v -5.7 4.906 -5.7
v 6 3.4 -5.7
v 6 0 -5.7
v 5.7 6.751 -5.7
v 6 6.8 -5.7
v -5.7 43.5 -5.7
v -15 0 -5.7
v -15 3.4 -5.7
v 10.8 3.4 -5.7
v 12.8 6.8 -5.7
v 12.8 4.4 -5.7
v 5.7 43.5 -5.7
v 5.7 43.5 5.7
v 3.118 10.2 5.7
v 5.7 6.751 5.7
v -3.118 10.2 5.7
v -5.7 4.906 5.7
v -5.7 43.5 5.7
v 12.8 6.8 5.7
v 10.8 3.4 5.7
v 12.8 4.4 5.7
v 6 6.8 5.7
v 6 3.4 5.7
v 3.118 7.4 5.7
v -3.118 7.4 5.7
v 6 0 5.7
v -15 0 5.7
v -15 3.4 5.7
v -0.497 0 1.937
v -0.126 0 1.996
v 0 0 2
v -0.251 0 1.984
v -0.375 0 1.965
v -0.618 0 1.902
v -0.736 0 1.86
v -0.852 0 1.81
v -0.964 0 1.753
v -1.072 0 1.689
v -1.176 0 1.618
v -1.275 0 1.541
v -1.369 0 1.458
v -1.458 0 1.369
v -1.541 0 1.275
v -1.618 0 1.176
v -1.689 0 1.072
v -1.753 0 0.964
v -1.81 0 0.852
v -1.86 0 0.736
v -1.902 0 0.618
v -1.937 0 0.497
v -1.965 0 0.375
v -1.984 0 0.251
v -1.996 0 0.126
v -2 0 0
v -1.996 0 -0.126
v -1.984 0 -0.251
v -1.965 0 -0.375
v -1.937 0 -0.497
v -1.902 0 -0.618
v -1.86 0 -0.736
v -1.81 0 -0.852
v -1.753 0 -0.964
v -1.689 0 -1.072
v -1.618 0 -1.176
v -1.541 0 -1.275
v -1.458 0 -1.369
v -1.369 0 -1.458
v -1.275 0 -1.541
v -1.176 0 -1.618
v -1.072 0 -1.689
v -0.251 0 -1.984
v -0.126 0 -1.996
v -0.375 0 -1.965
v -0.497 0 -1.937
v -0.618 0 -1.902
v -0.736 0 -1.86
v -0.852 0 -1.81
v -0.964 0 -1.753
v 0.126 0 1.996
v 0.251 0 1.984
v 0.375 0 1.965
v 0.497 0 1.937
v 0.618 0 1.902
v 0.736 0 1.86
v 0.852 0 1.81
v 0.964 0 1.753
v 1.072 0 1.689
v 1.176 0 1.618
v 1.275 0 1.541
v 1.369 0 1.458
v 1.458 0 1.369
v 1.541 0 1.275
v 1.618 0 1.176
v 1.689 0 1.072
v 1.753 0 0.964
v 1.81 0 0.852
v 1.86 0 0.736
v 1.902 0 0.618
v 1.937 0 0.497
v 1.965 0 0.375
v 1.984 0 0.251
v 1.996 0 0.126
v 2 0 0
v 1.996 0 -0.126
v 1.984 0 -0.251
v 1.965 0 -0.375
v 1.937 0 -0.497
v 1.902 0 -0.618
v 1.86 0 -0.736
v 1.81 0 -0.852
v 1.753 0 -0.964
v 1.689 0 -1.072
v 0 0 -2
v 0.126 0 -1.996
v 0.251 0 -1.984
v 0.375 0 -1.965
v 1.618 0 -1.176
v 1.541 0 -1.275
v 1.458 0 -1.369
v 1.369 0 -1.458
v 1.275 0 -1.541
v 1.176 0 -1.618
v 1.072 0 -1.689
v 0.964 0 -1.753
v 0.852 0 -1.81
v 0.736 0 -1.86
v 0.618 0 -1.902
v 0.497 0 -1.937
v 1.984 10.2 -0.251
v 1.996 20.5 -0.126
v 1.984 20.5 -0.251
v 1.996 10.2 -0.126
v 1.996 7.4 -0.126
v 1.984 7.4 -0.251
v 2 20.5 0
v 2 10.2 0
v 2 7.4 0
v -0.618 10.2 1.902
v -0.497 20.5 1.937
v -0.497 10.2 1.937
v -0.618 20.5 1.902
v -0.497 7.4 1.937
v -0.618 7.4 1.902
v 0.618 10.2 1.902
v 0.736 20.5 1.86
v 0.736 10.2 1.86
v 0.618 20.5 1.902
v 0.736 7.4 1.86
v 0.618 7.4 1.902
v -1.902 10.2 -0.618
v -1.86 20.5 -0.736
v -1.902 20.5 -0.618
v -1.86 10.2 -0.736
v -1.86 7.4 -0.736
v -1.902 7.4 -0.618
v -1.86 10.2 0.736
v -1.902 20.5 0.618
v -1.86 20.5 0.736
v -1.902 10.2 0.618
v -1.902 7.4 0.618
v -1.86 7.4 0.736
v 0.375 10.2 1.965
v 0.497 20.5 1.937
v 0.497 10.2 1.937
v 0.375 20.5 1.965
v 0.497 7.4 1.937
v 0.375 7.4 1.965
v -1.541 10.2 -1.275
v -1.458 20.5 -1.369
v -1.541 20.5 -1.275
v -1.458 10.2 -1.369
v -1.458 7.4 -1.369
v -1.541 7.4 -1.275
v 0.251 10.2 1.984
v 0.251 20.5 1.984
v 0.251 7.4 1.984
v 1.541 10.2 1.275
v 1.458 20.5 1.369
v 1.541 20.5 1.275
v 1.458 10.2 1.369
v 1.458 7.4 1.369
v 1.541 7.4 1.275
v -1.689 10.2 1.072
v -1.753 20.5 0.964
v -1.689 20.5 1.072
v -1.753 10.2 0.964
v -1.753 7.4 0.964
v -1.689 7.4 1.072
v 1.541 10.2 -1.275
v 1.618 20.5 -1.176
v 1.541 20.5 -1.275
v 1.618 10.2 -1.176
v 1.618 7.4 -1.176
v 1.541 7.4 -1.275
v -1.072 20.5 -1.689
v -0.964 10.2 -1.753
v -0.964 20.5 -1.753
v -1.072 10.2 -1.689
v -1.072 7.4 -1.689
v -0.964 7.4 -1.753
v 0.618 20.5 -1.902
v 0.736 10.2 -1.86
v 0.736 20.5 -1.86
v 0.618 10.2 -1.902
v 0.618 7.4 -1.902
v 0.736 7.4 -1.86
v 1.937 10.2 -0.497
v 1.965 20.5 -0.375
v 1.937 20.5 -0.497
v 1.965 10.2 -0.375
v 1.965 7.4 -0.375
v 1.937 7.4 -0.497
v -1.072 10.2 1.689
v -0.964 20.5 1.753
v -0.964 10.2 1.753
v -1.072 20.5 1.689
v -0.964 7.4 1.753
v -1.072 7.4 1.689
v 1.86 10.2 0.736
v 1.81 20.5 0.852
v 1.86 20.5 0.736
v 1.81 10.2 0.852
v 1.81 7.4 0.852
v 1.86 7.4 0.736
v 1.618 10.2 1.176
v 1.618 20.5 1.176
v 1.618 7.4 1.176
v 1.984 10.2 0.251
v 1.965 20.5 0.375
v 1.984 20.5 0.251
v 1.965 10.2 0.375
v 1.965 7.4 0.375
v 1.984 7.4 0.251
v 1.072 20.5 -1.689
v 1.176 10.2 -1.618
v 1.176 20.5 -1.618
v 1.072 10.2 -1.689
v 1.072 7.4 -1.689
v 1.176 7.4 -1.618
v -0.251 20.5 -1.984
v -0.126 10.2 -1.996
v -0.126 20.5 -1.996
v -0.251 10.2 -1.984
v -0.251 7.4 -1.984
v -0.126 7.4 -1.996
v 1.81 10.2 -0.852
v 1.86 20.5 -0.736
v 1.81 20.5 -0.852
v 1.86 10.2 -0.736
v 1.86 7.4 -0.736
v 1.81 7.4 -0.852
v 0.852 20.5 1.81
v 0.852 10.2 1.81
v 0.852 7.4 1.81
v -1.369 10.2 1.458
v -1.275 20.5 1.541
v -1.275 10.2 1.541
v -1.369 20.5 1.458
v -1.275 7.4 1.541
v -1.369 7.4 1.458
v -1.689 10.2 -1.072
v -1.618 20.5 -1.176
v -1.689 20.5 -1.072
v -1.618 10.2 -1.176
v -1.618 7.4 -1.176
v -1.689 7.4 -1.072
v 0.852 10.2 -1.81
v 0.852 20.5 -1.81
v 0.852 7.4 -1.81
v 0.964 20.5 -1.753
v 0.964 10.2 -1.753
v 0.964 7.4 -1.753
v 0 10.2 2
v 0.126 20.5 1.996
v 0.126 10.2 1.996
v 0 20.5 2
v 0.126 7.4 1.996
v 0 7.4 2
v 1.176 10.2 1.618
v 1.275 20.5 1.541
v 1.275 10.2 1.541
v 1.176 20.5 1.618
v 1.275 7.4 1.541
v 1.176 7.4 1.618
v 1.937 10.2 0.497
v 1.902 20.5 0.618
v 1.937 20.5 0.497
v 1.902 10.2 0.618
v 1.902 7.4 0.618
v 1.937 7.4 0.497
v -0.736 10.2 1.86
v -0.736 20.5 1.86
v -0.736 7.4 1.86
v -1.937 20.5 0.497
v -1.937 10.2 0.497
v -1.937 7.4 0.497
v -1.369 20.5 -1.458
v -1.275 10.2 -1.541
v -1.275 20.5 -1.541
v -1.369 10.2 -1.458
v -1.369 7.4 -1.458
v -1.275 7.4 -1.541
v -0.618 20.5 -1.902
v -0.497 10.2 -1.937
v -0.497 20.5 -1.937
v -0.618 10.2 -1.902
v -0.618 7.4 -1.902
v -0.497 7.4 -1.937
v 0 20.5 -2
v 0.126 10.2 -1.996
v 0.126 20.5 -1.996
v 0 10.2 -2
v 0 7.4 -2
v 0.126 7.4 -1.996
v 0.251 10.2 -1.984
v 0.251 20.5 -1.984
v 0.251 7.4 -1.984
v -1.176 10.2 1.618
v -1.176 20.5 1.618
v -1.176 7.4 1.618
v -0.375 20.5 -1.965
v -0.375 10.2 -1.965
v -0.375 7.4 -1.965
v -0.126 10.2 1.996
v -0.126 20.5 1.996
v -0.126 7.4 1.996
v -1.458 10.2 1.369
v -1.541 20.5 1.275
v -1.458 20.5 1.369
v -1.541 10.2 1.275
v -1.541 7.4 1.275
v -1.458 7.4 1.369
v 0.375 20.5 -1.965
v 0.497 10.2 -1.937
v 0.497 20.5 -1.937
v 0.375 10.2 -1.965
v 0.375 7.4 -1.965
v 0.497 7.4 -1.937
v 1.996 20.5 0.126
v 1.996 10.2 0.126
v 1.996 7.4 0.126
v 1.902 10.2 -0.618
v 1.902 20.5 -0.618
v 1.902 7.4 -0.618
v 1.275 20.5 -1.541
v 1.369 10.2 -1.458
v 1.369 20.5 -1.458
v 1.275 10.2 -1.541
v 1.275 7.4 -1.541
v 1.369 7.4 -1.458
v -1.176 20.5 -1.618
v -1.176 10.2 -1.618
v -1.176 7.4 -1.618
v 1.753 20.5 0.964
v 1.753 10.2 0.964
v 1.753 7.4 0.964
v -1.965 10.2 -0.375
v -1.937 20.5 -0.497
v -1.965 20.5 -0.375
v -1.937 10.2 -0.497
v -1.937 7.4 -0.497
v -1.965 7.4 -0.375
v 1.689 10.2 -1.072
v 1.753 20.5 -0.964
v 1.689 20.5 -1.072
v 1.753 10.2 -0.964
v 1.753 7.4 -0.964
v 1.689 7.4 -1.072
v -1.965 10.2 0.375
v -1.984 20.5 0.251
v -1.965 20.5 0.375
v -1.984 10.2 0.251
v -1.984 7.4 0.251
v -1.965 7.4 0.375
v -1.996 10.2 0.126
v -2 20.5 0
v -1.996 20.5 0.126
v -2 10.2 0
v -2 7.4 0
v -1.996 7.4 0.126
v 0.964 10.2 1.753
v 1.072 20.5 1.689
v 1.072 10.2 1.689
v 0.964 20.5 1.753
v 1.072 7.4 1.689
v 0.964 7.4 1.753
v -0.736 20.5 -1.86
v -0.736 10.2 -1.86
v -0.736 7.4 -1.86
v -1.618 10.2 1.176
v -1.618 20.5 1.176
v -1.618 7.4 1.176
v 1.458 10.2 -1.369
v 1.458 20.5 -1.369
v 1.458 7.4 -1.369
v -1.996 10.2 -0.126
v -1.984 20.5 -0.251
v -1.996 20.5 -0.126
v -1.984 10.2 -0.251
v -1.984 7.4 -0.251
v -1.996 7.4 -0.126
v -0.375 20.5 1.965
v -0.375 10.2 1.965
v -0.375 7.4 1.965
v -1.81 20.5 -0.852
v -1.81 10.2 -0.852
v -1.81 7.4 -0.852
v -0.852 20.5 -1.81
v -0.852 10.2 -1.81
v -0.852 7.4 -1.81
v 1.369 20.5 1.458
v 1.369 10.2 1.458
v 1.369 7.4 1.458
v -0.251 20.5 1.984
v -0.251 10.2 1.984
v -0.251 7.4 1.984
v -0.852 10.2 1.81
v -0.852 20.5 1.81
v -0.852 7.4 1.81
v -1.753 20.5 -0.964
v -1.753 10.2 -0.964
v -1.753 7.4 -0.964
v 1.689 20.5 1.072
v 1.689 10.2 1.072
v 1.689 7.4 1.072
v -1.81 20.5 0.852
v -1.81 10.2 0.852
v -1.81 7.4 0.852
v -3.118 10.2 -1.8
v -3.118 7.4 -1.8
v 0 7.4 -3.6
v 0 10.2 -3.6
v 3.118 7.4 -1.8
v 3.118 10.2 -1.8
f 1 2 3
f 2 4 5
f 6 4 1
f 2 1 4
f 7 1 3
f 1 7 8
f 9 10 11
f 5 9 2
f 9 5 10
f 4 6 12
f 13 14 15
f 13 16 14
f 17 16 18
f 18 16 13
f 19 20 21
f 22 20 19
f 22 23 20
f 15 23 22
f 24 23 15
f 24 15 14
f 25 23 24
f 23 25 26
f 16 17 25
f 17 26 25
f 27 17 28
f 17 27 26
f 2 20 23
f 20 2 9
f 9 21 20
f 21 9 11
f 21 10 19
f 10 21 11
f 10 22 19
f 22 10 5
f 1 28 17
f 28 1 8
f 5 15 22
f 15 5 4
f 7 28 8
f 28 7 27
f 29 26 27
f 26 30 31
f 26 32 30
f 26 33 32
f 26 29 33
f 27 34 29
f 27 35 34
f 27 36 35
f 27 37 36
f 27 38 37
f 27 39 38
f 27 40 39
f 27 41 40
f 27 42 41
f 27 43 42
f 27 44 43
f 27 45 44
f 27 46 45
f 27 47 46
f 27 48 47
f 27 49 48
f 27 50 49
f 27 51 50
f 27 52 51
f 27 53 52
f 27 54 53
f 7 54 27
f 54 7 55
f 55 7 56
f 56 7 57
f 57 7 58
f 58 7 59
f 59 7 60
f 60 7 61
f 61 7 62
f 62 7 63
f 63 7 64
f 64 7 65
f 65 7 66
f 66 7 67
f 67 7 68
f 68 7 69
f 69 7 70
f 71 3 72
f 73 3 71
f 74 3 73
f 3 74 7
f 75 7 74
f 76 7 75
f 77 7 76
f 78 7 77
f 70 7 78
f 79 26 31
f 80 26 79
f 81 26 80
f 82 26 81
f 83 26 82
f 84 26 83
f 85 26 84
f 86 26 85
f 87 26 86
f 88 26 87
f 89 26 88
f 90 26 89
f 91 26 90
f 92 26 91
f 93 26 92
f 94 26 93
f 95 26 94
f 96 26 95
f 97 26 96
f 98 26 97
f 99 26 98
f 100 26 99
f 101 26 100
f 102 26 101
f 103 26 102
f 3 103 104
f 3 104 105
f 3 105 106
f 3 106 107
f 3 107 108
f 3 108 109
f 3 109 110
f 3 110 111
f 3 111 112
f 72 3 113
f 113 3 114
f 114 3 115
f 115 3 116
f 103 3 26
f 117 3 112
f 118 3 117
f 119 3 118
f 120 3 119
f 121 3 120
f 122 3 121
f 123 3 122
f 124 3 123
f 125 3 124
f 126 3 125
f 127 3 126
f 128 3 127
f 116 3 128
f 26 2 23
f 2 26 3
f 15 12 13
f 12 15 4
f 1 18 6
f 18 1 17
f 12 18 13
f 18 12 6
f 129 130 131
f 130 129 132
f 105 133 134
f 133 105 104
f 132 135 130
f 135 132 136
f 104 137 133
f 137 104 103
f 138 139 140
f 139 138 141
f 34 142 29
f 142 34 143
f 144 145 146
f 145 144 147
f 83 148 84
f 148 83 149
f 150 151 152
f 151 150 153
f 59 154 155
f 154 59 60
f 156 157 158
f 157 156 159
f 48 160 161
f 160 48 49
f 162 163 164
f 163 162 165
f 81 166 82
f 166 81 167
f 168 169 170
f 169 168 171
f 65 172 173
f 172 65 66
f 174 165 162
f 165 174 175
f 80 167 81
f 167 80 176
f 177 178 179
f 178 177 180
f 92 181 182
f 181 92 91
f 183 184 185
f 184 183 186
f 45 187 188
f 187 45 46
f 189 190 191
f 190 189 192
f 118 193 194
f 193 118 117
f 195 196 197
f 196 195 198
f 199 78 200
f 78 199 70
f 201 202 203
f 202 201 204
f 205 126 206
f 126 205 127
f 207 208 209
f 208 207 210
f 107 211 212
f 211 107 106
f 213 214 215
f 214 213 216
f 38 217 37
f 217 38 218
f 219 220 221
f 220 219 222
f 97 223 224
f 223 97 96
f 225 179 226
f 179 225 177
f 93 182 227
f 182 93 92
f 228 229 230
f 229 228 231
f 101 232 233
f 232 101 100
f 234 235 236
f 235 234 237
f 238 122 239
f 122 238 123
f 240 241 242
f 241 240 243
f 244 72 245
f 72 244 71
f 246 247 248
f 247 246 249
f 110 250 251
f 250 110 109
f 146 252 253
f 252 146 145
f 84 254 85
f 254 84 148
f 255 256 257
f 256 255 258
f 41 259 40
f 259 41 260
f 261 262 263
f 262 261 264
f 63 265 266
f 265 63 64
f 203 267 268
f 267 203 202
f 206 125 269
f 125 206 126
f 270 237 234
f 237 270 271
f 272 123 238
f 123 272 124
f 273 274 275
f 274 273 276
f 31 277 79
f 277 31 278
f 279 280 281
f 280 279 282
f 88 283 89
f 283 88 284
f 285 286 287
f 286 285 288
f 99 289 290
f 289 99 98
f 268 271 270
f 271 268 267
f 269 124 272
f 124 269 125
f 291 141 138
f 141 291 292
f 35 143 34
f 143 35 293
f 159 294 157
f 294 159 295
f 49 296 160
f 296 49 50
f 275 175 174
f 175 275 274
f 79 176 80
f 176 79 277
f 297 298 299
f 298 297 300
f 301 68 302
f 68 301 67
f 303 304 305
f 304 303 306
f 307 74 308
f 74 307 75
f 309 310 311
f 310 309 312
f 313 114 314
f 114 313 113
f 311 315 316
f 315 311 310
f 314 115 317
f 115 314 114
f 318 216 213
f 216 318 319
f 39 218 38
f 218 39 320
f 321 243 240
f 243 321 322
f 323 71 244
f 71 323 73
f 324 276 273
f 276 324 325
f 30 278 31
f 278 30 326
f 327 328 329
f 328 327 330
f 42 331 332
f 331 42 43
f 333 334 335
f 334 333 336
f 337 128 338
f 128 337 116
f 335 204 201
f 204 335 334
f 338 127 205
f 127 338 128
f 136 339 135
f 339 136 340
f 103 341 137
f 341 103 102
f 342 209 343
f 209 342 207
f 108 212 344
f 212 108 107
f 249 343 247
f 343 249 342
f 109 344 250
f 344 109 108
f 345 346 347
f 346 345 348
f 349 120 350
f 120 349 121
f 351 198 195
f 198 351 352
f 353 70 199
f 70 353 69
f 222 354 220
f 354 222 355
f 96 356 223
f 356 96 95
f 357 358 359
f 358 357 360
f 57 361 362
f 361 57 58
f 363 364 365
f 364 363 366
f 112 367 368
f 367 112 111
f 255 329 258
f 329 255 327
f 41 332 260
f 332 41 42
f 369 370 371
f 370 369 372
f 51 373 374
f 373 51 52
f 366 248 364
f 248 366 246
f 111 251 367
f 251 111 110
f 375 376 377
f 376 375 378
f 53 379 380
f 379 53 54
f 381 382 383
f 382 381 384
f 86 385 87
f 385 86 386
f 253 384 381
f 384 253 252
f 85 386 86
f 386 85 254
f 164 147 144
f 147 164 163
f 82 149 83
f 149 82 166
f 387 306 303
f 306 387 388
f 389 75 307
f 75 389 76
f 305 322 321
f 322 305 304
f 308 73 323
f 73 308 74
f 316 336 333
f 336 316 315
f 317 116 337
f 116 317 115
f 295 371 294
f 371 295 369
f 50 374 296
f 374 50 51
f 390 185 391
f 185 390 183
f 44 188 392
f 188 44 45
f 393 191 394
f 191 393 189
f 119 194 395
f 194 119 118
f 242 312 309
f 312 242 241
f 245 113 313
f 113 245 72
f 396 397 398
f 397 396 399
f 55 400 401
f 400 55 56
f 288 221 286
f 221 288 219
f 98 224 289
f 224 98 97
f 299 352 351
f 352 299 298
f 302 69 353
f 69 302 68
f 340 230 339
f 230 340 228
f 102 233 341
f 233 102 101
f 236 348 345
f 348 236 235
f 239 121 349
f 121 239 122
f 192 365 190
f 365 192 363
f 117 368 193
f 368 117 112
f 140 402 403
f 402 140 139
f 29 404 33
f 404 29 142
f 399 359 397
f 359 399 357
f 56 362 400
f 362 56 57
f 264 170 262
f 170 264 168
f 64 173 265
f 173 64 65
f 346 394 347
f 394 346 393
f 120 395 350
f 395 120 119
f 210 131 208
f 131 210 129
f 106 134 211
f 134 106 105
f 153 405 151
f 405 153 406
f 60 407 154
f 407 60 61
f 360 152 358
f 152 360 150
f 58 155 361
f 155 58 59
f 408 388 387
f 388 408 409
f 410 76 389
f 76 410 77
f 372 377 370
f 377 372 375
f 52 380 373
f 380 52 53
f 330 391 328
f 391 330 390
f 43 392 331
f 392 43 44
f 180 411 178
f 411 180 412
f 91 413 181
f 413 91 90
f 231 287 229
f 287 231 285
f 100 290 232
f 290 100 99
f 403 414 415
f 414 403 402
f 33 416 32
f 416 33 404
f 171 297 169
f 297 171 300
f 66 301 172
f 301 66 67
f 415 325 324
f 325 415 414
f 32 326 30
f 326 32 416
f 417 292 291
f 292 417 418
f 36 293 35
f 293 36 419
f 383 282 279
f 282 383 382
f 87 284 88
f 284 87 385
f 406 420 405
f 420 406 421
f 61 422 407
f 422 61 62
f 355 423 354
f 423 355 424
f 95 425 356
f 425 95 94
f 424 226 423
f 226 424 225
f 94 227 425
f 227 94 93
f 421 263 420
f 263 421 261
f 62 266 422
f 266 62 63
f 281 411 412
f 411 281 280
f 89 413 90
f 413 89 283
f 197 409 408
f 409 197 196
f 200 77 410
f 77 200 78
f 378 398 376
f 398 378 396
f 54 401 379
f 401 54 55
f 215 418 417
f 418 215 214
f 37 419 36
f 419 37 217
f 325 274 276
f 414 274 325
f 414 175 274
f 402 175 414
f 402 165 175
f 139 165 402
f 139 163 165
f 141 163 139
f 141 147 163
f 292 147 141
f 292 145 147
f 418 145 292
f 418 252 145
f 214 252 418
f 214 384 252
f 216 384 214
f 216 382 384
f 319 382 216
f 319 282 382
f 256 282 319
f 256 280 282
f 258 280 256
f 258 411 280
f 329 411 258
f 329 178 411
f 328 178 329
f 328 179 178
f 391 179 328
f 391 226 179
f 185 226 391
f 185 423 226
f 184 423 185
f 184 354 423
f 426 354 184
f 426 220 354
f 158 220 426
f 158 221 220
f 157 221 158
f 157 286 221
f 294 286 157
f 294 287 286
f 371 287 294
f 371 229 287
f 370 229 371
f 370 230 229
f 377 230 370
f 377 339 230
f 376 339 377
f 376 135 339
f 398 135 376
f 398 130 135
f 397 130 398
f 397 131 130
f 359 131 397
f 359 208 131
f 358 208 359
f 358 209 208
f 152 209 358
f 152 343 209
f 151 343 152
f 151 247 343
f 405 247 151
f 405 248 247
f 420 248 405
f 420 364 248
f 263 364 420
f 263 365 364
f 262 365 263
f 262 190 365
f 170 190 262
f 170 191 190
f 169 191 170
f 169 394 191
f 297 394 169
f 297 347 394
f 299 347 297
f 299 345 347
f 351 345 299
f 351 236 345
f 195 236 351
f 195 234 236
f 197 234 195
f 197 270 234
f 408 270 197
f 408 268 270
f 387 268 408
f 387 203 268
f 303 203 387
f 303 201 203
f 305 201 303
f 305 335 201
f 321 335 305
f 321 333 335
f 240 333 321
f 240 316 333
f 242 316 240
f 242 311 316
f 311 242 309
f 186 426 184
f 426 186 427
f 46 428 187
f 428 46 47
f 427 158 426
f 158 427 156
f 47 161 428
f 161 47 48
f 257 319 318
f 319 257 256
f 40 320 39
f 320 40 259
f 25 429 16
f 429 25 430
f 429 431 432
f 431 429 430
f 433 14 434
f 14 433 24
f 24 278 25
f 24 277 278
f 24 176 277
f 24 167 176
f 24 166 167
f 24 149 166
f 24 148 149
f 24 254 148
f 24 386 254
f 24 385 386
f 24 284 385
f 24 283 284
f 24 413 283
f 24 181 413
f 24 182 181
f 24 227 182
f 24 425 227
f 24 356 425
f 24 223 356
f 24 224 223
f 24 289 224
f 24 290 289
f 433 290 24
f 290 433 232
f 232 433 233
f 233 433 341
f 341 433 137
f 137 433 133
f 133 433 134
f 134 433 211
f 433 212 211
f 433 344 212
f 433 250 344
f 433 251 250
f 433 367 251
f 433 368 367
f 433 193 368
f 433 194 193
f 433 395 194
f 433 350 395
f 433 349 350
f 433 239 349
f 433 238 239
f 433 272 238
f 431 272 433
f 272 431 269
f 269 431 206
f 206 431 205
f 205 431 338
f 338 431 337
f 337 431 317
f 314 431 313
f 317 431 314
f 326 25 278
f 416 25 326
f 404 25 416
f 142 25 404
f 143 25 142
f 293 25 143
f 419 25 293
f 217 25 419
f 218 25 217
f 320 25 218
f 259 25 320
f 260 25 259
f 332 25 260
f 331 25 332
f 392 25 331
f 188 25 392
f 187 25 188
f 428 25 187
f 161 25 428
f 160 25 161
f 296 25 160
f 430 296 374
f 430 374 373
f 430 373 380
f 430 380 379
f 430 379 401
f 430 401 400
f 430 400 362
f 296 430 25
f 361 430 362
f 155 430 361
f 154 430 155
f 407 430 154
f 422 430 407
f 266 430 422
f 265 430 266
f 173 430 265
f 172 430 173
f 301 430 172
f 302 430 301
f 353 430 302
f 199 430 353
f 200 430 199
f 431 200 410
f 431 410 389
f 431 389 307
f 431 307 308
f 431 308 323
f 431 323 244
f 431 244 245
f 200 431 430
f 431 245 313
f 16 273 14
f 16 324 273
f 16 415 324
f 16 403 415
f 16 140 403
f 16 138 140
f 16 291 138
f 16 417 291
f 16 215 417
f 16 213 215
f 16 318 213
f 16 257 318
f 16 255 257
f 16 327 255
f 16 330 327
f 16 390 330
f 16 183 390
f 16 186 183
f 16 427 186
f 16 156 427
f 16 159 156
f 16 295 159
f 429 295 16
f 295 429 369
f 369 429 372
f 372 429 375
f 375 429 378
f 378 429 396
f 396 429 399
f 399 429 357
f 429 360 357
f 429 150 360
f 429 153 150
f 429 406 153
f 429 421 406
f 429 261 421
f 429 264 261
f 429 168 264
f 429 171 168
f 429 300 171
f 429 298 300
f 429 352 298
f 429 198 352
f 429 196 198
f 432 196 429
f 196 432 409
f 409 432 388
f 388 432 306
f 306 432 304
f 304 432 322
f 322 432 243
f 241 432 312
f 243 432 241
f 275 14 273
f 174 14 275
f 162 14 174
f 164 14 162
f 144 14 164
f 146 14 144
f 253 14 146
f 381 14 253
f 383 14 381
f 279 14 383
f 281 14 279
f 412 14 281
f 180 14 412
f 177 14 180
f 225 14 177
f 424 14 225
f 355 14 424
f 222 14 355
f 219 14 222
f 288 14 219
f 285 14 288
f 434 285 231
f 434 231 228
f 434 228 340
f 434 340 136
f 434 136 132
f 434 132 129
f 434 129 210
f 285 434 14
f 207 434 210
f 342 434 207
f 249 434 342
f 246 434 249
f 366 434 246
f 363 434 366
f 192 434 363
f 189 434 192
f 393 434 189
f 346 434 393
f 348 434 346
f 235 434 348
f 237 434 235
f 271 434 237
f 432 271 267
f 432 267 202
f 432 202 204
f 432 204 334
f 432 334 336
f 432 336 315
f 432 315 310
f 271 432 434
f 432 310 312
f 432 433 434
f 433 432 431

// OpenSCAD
use <MCAD/nuts_and_bolts.scad>

L = 11.4;
l1 = 6;
l2 = 15;
e = 3.4;
d = 4;
D = 8;
feet_long = 55-11.5;

difference() {
	union() {
		linear_extrude(height = L, center = true) 
			polygon([
			  [l1,0],
			  [l1,e],
			  [l1+2*e-2, e],
			  [l1+2*e, e+1],
			  [l1+2*e, 2*e],
			  [l1, 2*e],
			  [-l2, e],
			  [-l2, 0]
			], 1);

		translate([0,feet_long/2,0]) {
			cube([L,feet_long,L], center = true);
		}
	}

	translate([0,10,0])
	rotate([-90,0,0])
		cylinder (h = 21, d=d, center = true, $fn=100);
	
	translate([0,3*e,0])
	hull(){
		translate([0,0,10])
		rotate([90,90,0])
			nutHole(3, tolerance = 0.4);
		rotate([90,90,0])
			nutHole(3, tolerance = 0.4);
	}
}
